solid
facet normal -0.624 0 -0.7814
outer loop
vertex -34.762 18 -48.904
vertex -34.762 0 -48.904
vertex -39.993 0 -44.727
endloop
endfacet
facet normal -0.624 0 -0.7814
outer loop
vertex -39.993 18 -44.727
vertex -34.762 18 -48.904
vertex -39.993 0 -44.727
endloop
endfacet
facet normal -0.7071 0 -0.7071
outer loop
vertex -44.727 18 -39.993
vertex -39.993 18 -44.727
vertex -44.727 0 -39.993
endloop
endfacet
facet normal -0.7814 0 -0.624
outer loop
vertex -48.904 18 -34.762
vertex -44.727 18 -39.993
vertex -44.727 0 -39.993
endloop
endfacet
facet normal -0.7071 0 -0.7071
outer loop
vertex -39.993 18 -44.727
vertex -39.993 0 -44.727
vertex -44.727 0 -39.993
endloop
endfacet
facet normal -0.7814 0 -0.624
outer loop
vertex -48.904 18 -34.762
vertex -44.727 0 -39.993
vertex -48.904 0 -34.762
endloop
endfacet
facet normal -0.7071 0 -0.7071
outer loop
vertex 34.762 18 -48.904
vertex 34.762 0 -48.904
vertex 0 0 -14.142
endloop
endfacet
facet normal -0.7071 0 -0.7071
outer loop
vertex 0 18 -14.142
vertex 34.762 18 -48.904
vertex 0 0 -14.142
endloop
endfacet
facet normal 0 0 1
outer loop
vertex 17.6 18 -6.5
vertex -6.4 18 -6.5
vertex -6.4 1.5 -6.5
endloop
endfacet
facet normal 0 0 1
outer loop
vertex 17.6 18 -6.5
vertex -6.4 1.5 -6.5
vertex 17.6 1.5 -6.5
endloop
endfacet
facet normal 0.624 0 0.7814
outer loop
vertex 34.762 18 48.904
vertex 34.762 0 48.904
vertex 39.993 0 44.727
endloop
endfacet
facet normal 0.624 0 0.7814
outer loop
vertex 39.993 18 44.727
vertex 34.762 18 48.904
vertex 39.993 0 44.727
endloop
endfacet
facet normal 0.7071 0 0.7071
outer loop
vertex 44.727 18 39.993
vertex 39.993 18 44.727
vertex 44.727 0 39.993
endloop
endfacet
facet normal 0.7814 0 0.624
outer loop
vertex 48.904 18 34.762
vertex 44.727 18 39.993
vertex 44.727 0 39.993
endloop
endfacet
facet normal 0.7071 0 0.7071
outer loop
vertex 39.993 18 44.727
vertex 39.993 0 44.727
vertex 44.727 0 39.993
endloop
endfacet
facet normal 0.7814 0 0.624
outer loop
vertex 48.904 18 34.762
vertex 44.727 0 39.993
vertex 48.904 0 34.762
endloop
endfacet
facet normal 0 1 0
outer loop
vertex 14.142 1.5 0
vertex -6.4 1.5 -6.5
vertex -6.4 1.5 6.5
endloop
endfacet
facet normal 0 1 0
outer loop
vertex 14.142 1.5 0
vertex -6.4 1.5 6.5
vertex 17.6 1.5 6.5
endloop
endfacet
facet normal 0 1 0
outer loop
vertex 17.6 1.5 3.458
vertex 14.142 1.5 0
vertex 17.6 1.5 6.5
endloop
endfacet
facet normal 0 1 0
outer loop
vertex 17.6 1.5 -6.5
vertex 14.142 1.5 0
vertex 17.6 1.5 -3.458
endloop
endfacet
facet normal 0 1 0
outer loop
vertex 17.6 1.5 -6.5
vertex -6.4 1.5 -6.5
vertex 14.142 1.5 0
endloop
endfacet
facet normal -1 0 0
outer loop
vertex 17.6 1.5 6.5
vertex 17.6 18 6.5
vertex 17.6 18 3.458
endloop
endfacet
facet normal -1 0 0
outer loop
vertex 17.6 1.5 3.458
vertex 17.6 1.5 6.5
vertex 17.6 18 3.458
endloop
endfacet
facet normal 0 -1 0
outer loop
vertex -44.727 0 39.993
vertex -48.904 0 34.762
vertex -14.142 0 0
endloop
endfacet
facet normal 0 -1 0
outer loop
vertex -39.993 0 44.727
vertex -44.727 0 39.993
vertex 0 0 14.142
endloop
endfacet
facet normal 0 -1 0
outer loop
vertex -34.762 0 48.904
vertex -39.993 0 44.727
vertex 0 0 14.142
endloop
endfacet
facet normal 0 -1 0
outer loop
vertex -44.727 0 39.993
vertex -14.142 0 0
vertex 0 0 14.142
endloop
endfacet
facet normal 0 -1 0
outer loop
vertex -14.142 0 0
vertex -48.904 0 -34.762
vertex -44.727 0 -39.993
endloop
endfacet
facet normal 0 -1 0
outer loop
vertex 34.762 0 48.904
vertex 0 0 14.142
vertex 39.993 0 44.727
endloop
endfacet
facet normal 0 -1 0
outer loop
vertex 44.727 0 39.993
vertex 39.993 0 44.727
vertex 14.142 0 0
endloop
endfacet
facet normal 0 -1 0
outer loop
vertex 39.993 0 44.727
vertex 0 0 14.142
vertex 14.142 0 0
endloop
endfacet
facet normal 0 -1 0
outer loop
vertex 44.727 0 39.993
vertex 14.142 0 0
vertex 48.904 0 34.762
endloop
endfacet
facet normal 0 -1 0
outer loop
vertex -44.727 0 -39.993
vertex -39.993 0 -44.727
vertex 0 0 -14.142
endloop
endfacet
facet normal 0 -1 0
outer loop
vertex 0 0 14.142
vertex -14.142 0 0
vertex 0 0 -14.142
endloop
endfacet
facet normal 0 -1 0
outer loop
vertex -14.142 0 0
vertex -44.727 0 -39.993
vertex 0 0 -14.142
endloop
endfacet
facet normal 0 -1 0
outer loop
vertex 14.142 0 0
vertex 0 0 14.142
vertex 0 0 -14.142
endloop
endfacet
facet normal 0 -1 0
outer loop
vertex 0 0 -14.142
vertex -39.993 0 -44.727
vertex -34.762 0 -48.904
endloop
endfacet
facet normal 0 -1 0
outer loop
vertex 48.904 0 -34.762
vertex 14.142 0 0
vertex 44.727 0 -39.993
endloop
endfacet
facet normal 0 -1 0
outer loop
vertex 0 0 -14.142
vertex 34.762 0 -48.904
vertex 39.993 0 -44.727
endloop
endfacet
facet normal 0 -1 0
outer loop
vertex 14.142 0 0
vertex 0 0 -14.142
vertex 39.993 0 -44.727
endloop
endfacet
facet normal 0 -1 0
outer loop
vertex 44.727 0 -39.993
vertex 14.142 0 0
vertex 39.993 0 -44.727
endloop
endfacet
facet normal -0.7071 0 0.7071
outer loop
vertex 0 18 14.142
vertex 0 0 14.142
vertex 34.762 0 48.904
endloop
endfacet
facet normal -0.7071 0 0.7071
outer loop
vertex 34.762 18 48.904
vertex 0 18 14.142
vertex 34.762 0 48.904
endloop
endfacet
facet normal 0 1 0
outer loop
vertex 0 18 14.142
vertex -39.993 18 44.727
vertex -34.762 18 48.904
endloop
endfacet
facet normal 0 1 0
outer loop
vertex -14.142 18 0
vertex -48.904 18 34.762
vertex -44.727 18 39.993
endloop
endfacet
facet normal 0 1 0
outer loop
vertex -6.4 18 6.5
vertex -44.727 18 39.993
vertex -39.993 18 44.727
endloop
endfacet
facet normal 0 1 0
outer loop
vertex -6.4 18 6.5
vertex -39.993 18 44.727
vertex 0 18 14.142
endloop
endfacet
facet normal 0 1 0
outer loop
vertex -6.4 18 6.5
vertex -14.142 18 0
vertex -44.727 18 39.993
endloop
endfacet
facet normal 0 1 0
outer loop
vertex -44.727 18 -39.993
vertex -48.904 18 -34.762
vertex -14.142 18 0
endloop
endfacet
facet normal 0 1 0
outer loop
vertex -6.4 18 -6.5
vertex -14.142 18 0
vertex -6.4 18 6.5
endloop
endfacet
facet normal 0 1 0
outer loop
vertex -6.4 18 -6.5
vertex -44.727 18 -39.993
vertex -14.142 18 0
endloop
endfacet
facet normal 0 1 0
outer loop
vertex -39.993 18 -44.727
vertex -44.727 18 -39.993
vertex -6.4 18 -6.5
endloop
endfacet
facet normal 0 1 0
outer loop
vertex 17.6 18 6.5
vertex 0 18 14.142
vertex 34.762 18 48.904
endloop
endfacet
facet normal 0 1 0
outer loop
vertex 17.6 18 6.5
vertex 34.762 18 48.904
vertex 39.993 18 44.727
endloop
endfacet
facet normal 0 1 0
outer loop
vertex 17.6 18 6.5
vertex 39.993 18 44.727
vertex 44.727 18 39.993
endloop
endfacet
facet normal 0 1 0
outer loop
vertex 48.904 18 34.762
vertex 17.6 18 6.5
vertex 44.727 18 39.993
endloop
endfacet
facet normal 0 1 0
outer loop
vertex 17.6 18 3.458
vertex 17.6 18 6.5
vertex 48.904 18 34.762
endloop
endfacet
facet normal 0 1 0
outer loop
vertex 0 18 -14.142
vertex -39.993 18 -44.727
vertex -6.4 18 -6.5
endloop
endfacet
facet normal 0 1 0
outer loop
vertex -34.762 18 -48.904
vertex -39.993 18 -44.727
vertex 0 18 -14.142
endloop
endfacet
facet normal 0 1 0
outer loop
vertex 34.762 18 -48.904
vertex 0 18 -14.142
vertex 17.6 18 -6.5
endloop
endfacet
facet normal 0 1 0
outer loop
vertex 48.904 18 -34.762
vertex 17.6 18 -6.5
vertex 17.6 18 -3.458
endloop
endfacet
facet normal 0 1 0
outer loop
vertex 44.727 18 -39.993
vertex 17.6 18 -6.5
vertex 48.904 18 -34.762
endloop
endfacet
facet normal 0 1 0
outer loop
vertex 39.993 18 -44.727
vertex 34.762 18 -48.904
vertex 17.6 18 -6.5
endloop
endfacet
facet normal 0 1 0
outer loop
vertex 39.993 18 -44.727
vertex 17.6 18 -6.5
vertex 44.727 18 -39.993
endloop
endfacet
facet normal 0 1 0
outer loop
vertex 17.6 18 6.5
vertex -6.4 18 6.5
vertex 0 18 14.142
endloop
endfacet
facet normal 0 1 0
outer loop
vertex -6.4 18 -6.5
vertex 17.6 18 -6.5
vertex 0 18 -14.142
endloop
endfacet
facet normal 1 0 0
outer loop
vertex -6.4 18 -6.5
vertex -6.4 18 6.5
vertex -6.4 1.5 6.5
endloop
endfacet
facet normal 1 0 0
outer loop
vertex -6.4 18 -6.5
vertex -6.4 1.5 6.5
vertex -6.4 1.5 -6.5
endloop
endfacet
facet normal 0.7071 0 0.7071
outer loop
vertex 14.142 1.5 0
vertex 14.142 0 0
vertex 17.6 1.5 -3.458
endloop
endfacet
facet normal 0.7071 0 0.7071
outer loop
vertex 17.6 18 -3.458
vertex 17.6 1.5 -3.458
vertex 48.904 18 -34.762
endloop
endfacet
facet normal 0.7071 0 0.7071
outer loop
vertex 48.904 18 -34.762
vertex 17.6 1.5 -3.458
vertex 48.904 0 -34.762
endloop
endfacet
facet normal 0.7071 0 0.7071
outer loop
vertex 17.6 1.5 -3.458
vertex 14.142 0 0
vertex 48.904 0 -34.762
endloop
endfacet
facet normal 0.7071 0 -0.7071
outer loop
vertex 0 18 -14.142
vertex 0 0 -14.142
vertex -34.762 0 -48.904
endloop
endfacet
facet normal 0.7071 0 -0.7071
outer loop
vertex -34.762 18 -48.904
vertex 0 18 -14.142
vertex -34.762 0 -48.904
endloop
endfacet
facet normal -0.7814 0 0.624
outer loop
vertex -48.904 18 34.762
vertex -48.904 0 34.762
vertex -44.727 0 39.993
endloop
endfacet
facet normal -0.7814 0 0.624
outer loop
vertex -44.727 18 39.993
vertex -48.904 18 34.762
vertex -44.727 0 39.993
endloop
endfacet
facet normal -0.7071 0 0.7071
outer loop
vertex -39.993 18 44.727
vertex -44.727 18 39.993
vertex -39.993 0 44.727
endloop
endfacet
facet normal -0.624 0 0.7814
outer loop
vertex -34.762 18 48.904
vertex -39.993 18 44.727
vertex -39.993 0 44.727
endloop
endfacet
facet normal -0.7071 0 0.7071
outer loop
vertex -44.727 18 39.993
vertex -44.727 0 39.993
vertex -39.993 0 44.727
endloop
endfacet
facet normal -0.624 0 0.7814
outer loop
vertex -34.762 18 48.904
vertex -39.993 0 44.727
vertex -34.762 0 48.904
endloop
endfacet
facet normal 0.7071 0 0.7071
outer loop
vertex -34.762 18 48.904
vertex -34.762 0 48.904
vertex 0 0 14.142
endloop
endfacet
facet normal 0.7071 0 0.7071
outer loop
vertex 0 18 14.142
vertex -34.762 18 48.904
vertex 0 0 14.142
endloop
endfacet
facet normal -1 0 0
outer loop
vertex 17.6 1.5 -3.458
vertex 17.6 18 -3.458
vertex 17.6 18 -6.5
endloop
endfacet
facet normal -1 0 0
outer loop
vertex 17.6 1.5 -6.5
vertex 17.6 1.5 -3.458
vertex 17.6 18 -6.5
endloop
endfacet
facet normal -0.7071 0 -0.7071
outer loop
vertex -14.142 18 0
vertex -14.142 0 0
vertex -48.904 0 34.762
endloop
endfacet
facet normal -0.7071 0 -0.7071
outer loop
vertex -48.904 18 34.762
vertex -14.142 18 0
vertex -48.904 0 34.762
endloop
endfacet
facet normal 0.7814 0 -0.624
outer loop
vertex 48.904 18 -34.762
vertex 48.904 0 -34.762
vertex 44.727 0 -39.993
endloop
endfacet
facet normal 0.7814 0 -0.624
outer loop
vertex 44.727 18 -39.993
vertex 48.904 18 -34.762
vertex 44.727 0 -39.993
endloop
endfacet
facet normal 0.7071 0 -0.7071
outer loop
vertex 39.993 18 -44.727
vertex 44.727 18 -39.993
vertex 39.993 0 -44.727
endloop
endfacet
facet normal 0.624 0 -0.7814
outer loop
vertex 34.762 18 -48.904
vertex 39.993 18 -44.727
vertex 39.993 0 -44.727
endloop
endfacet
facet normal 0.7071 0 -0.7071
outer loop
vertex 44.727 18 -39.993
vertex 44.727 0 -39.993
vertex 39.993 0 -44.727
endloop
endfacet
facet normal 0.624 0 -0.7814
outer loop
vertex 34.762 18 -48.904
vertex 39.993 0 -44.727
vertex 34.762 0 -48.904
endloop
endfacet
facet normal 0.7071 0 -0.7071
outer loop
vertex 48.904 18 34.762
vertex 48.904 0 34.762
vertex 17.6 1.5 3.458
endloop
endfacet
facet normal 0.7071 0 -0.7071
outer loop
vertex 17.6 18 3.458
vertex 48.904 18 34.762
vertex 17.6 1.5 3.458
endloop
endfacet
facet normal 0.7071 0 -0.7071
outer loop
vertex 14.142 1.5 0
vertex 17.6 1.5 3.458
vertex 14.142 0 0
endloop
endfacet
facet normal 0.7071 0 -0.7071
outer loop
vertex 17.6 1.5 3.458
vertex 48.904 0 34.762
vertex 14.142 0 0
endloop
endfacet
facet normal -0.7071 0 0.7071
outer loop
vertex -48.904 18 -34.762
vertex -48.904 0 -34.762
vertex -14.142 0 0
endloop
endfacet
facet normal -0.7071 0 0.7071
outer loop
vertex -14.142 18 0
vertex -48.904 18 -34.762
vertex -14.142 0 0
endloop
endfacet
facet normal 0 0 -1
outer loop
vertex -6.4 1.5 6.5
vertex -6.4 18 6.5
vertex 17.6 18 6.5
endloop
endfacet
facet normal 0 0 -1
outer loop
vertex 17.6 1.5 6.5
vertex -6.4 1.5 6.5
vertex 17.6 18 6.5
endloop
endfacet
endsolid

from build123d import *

# Parameters (mm, degrees)
BOSS_EXTRUDE2_DEPTH = 18
SKETCH7_W           = 24
SKETCH7_H           = 13
CUT_EXTRUDE8_DEPTH  = 16.5


with BuildPart() as part:
    # Sketch2 → Boss-Extrude2 (new body)
    with BuildSketch(Plane(origin=(0, 0, 0), x_dir=(1, 0, 0), z_dir=(0, 1, 0))):
        with BuildLine():
            Line((14.142135624, 0), (48.904069139, 34.761933515))
            ThreePointArc((48.904069139, 34.761933515), (42.426406871, 42.426406871), (34.761933515, 48.904069139))
            Line((34.761933515, 48.904069139), (0, 14.142135624))
            Line((0, 14.142135624), (-34.761933515, 48.904069139))
            ThreePointArc((-34.761933515, 48.904069139), (-42.426406871, 42.426406871), (-48.904069139, 34.761933515))
            Line((-48.904069139, 34.761933515), (-14.142135624, 0))
            Line((-14.142135624, 0), (-48.904069139, -34.761933515))
            ThreePointArc((-48.904069139, -34.761933515), (-42.426406871, -42.426406871), (-34.761933515, -48.904069139))
            Line((-34.761933515, -48.904069139), (0, -14.142135624))
            Line((0, -14.142135624), (34.761933515, -48.904069139))
            ThreePointArc((34.761933515, -48.904069139), (42.426406871, -42.426406871), (48.904069139, -34.761933515))
            Line((48.904069139, -34.761933515), (14.142135624, 0))
        make_face()
    extrude(amount=BOSS_EXTRUDE2_DEPTH)

    # Sketch7 → Cut-Extrude8 (cut)
    with BuildSketch(Plane(origin=(0, 18, 0), x_dir=(1, 0, 0), z_dir=(0, 1, 0))):
        with Locations((5.6, 0)):
            Rectangle(SKETCH7_W, SKETCH7_H)
    extrude(amount=-CUT_EXTRUDE8_DEPTH, mode=Mode.SUBTRACT)


solid = part.part
